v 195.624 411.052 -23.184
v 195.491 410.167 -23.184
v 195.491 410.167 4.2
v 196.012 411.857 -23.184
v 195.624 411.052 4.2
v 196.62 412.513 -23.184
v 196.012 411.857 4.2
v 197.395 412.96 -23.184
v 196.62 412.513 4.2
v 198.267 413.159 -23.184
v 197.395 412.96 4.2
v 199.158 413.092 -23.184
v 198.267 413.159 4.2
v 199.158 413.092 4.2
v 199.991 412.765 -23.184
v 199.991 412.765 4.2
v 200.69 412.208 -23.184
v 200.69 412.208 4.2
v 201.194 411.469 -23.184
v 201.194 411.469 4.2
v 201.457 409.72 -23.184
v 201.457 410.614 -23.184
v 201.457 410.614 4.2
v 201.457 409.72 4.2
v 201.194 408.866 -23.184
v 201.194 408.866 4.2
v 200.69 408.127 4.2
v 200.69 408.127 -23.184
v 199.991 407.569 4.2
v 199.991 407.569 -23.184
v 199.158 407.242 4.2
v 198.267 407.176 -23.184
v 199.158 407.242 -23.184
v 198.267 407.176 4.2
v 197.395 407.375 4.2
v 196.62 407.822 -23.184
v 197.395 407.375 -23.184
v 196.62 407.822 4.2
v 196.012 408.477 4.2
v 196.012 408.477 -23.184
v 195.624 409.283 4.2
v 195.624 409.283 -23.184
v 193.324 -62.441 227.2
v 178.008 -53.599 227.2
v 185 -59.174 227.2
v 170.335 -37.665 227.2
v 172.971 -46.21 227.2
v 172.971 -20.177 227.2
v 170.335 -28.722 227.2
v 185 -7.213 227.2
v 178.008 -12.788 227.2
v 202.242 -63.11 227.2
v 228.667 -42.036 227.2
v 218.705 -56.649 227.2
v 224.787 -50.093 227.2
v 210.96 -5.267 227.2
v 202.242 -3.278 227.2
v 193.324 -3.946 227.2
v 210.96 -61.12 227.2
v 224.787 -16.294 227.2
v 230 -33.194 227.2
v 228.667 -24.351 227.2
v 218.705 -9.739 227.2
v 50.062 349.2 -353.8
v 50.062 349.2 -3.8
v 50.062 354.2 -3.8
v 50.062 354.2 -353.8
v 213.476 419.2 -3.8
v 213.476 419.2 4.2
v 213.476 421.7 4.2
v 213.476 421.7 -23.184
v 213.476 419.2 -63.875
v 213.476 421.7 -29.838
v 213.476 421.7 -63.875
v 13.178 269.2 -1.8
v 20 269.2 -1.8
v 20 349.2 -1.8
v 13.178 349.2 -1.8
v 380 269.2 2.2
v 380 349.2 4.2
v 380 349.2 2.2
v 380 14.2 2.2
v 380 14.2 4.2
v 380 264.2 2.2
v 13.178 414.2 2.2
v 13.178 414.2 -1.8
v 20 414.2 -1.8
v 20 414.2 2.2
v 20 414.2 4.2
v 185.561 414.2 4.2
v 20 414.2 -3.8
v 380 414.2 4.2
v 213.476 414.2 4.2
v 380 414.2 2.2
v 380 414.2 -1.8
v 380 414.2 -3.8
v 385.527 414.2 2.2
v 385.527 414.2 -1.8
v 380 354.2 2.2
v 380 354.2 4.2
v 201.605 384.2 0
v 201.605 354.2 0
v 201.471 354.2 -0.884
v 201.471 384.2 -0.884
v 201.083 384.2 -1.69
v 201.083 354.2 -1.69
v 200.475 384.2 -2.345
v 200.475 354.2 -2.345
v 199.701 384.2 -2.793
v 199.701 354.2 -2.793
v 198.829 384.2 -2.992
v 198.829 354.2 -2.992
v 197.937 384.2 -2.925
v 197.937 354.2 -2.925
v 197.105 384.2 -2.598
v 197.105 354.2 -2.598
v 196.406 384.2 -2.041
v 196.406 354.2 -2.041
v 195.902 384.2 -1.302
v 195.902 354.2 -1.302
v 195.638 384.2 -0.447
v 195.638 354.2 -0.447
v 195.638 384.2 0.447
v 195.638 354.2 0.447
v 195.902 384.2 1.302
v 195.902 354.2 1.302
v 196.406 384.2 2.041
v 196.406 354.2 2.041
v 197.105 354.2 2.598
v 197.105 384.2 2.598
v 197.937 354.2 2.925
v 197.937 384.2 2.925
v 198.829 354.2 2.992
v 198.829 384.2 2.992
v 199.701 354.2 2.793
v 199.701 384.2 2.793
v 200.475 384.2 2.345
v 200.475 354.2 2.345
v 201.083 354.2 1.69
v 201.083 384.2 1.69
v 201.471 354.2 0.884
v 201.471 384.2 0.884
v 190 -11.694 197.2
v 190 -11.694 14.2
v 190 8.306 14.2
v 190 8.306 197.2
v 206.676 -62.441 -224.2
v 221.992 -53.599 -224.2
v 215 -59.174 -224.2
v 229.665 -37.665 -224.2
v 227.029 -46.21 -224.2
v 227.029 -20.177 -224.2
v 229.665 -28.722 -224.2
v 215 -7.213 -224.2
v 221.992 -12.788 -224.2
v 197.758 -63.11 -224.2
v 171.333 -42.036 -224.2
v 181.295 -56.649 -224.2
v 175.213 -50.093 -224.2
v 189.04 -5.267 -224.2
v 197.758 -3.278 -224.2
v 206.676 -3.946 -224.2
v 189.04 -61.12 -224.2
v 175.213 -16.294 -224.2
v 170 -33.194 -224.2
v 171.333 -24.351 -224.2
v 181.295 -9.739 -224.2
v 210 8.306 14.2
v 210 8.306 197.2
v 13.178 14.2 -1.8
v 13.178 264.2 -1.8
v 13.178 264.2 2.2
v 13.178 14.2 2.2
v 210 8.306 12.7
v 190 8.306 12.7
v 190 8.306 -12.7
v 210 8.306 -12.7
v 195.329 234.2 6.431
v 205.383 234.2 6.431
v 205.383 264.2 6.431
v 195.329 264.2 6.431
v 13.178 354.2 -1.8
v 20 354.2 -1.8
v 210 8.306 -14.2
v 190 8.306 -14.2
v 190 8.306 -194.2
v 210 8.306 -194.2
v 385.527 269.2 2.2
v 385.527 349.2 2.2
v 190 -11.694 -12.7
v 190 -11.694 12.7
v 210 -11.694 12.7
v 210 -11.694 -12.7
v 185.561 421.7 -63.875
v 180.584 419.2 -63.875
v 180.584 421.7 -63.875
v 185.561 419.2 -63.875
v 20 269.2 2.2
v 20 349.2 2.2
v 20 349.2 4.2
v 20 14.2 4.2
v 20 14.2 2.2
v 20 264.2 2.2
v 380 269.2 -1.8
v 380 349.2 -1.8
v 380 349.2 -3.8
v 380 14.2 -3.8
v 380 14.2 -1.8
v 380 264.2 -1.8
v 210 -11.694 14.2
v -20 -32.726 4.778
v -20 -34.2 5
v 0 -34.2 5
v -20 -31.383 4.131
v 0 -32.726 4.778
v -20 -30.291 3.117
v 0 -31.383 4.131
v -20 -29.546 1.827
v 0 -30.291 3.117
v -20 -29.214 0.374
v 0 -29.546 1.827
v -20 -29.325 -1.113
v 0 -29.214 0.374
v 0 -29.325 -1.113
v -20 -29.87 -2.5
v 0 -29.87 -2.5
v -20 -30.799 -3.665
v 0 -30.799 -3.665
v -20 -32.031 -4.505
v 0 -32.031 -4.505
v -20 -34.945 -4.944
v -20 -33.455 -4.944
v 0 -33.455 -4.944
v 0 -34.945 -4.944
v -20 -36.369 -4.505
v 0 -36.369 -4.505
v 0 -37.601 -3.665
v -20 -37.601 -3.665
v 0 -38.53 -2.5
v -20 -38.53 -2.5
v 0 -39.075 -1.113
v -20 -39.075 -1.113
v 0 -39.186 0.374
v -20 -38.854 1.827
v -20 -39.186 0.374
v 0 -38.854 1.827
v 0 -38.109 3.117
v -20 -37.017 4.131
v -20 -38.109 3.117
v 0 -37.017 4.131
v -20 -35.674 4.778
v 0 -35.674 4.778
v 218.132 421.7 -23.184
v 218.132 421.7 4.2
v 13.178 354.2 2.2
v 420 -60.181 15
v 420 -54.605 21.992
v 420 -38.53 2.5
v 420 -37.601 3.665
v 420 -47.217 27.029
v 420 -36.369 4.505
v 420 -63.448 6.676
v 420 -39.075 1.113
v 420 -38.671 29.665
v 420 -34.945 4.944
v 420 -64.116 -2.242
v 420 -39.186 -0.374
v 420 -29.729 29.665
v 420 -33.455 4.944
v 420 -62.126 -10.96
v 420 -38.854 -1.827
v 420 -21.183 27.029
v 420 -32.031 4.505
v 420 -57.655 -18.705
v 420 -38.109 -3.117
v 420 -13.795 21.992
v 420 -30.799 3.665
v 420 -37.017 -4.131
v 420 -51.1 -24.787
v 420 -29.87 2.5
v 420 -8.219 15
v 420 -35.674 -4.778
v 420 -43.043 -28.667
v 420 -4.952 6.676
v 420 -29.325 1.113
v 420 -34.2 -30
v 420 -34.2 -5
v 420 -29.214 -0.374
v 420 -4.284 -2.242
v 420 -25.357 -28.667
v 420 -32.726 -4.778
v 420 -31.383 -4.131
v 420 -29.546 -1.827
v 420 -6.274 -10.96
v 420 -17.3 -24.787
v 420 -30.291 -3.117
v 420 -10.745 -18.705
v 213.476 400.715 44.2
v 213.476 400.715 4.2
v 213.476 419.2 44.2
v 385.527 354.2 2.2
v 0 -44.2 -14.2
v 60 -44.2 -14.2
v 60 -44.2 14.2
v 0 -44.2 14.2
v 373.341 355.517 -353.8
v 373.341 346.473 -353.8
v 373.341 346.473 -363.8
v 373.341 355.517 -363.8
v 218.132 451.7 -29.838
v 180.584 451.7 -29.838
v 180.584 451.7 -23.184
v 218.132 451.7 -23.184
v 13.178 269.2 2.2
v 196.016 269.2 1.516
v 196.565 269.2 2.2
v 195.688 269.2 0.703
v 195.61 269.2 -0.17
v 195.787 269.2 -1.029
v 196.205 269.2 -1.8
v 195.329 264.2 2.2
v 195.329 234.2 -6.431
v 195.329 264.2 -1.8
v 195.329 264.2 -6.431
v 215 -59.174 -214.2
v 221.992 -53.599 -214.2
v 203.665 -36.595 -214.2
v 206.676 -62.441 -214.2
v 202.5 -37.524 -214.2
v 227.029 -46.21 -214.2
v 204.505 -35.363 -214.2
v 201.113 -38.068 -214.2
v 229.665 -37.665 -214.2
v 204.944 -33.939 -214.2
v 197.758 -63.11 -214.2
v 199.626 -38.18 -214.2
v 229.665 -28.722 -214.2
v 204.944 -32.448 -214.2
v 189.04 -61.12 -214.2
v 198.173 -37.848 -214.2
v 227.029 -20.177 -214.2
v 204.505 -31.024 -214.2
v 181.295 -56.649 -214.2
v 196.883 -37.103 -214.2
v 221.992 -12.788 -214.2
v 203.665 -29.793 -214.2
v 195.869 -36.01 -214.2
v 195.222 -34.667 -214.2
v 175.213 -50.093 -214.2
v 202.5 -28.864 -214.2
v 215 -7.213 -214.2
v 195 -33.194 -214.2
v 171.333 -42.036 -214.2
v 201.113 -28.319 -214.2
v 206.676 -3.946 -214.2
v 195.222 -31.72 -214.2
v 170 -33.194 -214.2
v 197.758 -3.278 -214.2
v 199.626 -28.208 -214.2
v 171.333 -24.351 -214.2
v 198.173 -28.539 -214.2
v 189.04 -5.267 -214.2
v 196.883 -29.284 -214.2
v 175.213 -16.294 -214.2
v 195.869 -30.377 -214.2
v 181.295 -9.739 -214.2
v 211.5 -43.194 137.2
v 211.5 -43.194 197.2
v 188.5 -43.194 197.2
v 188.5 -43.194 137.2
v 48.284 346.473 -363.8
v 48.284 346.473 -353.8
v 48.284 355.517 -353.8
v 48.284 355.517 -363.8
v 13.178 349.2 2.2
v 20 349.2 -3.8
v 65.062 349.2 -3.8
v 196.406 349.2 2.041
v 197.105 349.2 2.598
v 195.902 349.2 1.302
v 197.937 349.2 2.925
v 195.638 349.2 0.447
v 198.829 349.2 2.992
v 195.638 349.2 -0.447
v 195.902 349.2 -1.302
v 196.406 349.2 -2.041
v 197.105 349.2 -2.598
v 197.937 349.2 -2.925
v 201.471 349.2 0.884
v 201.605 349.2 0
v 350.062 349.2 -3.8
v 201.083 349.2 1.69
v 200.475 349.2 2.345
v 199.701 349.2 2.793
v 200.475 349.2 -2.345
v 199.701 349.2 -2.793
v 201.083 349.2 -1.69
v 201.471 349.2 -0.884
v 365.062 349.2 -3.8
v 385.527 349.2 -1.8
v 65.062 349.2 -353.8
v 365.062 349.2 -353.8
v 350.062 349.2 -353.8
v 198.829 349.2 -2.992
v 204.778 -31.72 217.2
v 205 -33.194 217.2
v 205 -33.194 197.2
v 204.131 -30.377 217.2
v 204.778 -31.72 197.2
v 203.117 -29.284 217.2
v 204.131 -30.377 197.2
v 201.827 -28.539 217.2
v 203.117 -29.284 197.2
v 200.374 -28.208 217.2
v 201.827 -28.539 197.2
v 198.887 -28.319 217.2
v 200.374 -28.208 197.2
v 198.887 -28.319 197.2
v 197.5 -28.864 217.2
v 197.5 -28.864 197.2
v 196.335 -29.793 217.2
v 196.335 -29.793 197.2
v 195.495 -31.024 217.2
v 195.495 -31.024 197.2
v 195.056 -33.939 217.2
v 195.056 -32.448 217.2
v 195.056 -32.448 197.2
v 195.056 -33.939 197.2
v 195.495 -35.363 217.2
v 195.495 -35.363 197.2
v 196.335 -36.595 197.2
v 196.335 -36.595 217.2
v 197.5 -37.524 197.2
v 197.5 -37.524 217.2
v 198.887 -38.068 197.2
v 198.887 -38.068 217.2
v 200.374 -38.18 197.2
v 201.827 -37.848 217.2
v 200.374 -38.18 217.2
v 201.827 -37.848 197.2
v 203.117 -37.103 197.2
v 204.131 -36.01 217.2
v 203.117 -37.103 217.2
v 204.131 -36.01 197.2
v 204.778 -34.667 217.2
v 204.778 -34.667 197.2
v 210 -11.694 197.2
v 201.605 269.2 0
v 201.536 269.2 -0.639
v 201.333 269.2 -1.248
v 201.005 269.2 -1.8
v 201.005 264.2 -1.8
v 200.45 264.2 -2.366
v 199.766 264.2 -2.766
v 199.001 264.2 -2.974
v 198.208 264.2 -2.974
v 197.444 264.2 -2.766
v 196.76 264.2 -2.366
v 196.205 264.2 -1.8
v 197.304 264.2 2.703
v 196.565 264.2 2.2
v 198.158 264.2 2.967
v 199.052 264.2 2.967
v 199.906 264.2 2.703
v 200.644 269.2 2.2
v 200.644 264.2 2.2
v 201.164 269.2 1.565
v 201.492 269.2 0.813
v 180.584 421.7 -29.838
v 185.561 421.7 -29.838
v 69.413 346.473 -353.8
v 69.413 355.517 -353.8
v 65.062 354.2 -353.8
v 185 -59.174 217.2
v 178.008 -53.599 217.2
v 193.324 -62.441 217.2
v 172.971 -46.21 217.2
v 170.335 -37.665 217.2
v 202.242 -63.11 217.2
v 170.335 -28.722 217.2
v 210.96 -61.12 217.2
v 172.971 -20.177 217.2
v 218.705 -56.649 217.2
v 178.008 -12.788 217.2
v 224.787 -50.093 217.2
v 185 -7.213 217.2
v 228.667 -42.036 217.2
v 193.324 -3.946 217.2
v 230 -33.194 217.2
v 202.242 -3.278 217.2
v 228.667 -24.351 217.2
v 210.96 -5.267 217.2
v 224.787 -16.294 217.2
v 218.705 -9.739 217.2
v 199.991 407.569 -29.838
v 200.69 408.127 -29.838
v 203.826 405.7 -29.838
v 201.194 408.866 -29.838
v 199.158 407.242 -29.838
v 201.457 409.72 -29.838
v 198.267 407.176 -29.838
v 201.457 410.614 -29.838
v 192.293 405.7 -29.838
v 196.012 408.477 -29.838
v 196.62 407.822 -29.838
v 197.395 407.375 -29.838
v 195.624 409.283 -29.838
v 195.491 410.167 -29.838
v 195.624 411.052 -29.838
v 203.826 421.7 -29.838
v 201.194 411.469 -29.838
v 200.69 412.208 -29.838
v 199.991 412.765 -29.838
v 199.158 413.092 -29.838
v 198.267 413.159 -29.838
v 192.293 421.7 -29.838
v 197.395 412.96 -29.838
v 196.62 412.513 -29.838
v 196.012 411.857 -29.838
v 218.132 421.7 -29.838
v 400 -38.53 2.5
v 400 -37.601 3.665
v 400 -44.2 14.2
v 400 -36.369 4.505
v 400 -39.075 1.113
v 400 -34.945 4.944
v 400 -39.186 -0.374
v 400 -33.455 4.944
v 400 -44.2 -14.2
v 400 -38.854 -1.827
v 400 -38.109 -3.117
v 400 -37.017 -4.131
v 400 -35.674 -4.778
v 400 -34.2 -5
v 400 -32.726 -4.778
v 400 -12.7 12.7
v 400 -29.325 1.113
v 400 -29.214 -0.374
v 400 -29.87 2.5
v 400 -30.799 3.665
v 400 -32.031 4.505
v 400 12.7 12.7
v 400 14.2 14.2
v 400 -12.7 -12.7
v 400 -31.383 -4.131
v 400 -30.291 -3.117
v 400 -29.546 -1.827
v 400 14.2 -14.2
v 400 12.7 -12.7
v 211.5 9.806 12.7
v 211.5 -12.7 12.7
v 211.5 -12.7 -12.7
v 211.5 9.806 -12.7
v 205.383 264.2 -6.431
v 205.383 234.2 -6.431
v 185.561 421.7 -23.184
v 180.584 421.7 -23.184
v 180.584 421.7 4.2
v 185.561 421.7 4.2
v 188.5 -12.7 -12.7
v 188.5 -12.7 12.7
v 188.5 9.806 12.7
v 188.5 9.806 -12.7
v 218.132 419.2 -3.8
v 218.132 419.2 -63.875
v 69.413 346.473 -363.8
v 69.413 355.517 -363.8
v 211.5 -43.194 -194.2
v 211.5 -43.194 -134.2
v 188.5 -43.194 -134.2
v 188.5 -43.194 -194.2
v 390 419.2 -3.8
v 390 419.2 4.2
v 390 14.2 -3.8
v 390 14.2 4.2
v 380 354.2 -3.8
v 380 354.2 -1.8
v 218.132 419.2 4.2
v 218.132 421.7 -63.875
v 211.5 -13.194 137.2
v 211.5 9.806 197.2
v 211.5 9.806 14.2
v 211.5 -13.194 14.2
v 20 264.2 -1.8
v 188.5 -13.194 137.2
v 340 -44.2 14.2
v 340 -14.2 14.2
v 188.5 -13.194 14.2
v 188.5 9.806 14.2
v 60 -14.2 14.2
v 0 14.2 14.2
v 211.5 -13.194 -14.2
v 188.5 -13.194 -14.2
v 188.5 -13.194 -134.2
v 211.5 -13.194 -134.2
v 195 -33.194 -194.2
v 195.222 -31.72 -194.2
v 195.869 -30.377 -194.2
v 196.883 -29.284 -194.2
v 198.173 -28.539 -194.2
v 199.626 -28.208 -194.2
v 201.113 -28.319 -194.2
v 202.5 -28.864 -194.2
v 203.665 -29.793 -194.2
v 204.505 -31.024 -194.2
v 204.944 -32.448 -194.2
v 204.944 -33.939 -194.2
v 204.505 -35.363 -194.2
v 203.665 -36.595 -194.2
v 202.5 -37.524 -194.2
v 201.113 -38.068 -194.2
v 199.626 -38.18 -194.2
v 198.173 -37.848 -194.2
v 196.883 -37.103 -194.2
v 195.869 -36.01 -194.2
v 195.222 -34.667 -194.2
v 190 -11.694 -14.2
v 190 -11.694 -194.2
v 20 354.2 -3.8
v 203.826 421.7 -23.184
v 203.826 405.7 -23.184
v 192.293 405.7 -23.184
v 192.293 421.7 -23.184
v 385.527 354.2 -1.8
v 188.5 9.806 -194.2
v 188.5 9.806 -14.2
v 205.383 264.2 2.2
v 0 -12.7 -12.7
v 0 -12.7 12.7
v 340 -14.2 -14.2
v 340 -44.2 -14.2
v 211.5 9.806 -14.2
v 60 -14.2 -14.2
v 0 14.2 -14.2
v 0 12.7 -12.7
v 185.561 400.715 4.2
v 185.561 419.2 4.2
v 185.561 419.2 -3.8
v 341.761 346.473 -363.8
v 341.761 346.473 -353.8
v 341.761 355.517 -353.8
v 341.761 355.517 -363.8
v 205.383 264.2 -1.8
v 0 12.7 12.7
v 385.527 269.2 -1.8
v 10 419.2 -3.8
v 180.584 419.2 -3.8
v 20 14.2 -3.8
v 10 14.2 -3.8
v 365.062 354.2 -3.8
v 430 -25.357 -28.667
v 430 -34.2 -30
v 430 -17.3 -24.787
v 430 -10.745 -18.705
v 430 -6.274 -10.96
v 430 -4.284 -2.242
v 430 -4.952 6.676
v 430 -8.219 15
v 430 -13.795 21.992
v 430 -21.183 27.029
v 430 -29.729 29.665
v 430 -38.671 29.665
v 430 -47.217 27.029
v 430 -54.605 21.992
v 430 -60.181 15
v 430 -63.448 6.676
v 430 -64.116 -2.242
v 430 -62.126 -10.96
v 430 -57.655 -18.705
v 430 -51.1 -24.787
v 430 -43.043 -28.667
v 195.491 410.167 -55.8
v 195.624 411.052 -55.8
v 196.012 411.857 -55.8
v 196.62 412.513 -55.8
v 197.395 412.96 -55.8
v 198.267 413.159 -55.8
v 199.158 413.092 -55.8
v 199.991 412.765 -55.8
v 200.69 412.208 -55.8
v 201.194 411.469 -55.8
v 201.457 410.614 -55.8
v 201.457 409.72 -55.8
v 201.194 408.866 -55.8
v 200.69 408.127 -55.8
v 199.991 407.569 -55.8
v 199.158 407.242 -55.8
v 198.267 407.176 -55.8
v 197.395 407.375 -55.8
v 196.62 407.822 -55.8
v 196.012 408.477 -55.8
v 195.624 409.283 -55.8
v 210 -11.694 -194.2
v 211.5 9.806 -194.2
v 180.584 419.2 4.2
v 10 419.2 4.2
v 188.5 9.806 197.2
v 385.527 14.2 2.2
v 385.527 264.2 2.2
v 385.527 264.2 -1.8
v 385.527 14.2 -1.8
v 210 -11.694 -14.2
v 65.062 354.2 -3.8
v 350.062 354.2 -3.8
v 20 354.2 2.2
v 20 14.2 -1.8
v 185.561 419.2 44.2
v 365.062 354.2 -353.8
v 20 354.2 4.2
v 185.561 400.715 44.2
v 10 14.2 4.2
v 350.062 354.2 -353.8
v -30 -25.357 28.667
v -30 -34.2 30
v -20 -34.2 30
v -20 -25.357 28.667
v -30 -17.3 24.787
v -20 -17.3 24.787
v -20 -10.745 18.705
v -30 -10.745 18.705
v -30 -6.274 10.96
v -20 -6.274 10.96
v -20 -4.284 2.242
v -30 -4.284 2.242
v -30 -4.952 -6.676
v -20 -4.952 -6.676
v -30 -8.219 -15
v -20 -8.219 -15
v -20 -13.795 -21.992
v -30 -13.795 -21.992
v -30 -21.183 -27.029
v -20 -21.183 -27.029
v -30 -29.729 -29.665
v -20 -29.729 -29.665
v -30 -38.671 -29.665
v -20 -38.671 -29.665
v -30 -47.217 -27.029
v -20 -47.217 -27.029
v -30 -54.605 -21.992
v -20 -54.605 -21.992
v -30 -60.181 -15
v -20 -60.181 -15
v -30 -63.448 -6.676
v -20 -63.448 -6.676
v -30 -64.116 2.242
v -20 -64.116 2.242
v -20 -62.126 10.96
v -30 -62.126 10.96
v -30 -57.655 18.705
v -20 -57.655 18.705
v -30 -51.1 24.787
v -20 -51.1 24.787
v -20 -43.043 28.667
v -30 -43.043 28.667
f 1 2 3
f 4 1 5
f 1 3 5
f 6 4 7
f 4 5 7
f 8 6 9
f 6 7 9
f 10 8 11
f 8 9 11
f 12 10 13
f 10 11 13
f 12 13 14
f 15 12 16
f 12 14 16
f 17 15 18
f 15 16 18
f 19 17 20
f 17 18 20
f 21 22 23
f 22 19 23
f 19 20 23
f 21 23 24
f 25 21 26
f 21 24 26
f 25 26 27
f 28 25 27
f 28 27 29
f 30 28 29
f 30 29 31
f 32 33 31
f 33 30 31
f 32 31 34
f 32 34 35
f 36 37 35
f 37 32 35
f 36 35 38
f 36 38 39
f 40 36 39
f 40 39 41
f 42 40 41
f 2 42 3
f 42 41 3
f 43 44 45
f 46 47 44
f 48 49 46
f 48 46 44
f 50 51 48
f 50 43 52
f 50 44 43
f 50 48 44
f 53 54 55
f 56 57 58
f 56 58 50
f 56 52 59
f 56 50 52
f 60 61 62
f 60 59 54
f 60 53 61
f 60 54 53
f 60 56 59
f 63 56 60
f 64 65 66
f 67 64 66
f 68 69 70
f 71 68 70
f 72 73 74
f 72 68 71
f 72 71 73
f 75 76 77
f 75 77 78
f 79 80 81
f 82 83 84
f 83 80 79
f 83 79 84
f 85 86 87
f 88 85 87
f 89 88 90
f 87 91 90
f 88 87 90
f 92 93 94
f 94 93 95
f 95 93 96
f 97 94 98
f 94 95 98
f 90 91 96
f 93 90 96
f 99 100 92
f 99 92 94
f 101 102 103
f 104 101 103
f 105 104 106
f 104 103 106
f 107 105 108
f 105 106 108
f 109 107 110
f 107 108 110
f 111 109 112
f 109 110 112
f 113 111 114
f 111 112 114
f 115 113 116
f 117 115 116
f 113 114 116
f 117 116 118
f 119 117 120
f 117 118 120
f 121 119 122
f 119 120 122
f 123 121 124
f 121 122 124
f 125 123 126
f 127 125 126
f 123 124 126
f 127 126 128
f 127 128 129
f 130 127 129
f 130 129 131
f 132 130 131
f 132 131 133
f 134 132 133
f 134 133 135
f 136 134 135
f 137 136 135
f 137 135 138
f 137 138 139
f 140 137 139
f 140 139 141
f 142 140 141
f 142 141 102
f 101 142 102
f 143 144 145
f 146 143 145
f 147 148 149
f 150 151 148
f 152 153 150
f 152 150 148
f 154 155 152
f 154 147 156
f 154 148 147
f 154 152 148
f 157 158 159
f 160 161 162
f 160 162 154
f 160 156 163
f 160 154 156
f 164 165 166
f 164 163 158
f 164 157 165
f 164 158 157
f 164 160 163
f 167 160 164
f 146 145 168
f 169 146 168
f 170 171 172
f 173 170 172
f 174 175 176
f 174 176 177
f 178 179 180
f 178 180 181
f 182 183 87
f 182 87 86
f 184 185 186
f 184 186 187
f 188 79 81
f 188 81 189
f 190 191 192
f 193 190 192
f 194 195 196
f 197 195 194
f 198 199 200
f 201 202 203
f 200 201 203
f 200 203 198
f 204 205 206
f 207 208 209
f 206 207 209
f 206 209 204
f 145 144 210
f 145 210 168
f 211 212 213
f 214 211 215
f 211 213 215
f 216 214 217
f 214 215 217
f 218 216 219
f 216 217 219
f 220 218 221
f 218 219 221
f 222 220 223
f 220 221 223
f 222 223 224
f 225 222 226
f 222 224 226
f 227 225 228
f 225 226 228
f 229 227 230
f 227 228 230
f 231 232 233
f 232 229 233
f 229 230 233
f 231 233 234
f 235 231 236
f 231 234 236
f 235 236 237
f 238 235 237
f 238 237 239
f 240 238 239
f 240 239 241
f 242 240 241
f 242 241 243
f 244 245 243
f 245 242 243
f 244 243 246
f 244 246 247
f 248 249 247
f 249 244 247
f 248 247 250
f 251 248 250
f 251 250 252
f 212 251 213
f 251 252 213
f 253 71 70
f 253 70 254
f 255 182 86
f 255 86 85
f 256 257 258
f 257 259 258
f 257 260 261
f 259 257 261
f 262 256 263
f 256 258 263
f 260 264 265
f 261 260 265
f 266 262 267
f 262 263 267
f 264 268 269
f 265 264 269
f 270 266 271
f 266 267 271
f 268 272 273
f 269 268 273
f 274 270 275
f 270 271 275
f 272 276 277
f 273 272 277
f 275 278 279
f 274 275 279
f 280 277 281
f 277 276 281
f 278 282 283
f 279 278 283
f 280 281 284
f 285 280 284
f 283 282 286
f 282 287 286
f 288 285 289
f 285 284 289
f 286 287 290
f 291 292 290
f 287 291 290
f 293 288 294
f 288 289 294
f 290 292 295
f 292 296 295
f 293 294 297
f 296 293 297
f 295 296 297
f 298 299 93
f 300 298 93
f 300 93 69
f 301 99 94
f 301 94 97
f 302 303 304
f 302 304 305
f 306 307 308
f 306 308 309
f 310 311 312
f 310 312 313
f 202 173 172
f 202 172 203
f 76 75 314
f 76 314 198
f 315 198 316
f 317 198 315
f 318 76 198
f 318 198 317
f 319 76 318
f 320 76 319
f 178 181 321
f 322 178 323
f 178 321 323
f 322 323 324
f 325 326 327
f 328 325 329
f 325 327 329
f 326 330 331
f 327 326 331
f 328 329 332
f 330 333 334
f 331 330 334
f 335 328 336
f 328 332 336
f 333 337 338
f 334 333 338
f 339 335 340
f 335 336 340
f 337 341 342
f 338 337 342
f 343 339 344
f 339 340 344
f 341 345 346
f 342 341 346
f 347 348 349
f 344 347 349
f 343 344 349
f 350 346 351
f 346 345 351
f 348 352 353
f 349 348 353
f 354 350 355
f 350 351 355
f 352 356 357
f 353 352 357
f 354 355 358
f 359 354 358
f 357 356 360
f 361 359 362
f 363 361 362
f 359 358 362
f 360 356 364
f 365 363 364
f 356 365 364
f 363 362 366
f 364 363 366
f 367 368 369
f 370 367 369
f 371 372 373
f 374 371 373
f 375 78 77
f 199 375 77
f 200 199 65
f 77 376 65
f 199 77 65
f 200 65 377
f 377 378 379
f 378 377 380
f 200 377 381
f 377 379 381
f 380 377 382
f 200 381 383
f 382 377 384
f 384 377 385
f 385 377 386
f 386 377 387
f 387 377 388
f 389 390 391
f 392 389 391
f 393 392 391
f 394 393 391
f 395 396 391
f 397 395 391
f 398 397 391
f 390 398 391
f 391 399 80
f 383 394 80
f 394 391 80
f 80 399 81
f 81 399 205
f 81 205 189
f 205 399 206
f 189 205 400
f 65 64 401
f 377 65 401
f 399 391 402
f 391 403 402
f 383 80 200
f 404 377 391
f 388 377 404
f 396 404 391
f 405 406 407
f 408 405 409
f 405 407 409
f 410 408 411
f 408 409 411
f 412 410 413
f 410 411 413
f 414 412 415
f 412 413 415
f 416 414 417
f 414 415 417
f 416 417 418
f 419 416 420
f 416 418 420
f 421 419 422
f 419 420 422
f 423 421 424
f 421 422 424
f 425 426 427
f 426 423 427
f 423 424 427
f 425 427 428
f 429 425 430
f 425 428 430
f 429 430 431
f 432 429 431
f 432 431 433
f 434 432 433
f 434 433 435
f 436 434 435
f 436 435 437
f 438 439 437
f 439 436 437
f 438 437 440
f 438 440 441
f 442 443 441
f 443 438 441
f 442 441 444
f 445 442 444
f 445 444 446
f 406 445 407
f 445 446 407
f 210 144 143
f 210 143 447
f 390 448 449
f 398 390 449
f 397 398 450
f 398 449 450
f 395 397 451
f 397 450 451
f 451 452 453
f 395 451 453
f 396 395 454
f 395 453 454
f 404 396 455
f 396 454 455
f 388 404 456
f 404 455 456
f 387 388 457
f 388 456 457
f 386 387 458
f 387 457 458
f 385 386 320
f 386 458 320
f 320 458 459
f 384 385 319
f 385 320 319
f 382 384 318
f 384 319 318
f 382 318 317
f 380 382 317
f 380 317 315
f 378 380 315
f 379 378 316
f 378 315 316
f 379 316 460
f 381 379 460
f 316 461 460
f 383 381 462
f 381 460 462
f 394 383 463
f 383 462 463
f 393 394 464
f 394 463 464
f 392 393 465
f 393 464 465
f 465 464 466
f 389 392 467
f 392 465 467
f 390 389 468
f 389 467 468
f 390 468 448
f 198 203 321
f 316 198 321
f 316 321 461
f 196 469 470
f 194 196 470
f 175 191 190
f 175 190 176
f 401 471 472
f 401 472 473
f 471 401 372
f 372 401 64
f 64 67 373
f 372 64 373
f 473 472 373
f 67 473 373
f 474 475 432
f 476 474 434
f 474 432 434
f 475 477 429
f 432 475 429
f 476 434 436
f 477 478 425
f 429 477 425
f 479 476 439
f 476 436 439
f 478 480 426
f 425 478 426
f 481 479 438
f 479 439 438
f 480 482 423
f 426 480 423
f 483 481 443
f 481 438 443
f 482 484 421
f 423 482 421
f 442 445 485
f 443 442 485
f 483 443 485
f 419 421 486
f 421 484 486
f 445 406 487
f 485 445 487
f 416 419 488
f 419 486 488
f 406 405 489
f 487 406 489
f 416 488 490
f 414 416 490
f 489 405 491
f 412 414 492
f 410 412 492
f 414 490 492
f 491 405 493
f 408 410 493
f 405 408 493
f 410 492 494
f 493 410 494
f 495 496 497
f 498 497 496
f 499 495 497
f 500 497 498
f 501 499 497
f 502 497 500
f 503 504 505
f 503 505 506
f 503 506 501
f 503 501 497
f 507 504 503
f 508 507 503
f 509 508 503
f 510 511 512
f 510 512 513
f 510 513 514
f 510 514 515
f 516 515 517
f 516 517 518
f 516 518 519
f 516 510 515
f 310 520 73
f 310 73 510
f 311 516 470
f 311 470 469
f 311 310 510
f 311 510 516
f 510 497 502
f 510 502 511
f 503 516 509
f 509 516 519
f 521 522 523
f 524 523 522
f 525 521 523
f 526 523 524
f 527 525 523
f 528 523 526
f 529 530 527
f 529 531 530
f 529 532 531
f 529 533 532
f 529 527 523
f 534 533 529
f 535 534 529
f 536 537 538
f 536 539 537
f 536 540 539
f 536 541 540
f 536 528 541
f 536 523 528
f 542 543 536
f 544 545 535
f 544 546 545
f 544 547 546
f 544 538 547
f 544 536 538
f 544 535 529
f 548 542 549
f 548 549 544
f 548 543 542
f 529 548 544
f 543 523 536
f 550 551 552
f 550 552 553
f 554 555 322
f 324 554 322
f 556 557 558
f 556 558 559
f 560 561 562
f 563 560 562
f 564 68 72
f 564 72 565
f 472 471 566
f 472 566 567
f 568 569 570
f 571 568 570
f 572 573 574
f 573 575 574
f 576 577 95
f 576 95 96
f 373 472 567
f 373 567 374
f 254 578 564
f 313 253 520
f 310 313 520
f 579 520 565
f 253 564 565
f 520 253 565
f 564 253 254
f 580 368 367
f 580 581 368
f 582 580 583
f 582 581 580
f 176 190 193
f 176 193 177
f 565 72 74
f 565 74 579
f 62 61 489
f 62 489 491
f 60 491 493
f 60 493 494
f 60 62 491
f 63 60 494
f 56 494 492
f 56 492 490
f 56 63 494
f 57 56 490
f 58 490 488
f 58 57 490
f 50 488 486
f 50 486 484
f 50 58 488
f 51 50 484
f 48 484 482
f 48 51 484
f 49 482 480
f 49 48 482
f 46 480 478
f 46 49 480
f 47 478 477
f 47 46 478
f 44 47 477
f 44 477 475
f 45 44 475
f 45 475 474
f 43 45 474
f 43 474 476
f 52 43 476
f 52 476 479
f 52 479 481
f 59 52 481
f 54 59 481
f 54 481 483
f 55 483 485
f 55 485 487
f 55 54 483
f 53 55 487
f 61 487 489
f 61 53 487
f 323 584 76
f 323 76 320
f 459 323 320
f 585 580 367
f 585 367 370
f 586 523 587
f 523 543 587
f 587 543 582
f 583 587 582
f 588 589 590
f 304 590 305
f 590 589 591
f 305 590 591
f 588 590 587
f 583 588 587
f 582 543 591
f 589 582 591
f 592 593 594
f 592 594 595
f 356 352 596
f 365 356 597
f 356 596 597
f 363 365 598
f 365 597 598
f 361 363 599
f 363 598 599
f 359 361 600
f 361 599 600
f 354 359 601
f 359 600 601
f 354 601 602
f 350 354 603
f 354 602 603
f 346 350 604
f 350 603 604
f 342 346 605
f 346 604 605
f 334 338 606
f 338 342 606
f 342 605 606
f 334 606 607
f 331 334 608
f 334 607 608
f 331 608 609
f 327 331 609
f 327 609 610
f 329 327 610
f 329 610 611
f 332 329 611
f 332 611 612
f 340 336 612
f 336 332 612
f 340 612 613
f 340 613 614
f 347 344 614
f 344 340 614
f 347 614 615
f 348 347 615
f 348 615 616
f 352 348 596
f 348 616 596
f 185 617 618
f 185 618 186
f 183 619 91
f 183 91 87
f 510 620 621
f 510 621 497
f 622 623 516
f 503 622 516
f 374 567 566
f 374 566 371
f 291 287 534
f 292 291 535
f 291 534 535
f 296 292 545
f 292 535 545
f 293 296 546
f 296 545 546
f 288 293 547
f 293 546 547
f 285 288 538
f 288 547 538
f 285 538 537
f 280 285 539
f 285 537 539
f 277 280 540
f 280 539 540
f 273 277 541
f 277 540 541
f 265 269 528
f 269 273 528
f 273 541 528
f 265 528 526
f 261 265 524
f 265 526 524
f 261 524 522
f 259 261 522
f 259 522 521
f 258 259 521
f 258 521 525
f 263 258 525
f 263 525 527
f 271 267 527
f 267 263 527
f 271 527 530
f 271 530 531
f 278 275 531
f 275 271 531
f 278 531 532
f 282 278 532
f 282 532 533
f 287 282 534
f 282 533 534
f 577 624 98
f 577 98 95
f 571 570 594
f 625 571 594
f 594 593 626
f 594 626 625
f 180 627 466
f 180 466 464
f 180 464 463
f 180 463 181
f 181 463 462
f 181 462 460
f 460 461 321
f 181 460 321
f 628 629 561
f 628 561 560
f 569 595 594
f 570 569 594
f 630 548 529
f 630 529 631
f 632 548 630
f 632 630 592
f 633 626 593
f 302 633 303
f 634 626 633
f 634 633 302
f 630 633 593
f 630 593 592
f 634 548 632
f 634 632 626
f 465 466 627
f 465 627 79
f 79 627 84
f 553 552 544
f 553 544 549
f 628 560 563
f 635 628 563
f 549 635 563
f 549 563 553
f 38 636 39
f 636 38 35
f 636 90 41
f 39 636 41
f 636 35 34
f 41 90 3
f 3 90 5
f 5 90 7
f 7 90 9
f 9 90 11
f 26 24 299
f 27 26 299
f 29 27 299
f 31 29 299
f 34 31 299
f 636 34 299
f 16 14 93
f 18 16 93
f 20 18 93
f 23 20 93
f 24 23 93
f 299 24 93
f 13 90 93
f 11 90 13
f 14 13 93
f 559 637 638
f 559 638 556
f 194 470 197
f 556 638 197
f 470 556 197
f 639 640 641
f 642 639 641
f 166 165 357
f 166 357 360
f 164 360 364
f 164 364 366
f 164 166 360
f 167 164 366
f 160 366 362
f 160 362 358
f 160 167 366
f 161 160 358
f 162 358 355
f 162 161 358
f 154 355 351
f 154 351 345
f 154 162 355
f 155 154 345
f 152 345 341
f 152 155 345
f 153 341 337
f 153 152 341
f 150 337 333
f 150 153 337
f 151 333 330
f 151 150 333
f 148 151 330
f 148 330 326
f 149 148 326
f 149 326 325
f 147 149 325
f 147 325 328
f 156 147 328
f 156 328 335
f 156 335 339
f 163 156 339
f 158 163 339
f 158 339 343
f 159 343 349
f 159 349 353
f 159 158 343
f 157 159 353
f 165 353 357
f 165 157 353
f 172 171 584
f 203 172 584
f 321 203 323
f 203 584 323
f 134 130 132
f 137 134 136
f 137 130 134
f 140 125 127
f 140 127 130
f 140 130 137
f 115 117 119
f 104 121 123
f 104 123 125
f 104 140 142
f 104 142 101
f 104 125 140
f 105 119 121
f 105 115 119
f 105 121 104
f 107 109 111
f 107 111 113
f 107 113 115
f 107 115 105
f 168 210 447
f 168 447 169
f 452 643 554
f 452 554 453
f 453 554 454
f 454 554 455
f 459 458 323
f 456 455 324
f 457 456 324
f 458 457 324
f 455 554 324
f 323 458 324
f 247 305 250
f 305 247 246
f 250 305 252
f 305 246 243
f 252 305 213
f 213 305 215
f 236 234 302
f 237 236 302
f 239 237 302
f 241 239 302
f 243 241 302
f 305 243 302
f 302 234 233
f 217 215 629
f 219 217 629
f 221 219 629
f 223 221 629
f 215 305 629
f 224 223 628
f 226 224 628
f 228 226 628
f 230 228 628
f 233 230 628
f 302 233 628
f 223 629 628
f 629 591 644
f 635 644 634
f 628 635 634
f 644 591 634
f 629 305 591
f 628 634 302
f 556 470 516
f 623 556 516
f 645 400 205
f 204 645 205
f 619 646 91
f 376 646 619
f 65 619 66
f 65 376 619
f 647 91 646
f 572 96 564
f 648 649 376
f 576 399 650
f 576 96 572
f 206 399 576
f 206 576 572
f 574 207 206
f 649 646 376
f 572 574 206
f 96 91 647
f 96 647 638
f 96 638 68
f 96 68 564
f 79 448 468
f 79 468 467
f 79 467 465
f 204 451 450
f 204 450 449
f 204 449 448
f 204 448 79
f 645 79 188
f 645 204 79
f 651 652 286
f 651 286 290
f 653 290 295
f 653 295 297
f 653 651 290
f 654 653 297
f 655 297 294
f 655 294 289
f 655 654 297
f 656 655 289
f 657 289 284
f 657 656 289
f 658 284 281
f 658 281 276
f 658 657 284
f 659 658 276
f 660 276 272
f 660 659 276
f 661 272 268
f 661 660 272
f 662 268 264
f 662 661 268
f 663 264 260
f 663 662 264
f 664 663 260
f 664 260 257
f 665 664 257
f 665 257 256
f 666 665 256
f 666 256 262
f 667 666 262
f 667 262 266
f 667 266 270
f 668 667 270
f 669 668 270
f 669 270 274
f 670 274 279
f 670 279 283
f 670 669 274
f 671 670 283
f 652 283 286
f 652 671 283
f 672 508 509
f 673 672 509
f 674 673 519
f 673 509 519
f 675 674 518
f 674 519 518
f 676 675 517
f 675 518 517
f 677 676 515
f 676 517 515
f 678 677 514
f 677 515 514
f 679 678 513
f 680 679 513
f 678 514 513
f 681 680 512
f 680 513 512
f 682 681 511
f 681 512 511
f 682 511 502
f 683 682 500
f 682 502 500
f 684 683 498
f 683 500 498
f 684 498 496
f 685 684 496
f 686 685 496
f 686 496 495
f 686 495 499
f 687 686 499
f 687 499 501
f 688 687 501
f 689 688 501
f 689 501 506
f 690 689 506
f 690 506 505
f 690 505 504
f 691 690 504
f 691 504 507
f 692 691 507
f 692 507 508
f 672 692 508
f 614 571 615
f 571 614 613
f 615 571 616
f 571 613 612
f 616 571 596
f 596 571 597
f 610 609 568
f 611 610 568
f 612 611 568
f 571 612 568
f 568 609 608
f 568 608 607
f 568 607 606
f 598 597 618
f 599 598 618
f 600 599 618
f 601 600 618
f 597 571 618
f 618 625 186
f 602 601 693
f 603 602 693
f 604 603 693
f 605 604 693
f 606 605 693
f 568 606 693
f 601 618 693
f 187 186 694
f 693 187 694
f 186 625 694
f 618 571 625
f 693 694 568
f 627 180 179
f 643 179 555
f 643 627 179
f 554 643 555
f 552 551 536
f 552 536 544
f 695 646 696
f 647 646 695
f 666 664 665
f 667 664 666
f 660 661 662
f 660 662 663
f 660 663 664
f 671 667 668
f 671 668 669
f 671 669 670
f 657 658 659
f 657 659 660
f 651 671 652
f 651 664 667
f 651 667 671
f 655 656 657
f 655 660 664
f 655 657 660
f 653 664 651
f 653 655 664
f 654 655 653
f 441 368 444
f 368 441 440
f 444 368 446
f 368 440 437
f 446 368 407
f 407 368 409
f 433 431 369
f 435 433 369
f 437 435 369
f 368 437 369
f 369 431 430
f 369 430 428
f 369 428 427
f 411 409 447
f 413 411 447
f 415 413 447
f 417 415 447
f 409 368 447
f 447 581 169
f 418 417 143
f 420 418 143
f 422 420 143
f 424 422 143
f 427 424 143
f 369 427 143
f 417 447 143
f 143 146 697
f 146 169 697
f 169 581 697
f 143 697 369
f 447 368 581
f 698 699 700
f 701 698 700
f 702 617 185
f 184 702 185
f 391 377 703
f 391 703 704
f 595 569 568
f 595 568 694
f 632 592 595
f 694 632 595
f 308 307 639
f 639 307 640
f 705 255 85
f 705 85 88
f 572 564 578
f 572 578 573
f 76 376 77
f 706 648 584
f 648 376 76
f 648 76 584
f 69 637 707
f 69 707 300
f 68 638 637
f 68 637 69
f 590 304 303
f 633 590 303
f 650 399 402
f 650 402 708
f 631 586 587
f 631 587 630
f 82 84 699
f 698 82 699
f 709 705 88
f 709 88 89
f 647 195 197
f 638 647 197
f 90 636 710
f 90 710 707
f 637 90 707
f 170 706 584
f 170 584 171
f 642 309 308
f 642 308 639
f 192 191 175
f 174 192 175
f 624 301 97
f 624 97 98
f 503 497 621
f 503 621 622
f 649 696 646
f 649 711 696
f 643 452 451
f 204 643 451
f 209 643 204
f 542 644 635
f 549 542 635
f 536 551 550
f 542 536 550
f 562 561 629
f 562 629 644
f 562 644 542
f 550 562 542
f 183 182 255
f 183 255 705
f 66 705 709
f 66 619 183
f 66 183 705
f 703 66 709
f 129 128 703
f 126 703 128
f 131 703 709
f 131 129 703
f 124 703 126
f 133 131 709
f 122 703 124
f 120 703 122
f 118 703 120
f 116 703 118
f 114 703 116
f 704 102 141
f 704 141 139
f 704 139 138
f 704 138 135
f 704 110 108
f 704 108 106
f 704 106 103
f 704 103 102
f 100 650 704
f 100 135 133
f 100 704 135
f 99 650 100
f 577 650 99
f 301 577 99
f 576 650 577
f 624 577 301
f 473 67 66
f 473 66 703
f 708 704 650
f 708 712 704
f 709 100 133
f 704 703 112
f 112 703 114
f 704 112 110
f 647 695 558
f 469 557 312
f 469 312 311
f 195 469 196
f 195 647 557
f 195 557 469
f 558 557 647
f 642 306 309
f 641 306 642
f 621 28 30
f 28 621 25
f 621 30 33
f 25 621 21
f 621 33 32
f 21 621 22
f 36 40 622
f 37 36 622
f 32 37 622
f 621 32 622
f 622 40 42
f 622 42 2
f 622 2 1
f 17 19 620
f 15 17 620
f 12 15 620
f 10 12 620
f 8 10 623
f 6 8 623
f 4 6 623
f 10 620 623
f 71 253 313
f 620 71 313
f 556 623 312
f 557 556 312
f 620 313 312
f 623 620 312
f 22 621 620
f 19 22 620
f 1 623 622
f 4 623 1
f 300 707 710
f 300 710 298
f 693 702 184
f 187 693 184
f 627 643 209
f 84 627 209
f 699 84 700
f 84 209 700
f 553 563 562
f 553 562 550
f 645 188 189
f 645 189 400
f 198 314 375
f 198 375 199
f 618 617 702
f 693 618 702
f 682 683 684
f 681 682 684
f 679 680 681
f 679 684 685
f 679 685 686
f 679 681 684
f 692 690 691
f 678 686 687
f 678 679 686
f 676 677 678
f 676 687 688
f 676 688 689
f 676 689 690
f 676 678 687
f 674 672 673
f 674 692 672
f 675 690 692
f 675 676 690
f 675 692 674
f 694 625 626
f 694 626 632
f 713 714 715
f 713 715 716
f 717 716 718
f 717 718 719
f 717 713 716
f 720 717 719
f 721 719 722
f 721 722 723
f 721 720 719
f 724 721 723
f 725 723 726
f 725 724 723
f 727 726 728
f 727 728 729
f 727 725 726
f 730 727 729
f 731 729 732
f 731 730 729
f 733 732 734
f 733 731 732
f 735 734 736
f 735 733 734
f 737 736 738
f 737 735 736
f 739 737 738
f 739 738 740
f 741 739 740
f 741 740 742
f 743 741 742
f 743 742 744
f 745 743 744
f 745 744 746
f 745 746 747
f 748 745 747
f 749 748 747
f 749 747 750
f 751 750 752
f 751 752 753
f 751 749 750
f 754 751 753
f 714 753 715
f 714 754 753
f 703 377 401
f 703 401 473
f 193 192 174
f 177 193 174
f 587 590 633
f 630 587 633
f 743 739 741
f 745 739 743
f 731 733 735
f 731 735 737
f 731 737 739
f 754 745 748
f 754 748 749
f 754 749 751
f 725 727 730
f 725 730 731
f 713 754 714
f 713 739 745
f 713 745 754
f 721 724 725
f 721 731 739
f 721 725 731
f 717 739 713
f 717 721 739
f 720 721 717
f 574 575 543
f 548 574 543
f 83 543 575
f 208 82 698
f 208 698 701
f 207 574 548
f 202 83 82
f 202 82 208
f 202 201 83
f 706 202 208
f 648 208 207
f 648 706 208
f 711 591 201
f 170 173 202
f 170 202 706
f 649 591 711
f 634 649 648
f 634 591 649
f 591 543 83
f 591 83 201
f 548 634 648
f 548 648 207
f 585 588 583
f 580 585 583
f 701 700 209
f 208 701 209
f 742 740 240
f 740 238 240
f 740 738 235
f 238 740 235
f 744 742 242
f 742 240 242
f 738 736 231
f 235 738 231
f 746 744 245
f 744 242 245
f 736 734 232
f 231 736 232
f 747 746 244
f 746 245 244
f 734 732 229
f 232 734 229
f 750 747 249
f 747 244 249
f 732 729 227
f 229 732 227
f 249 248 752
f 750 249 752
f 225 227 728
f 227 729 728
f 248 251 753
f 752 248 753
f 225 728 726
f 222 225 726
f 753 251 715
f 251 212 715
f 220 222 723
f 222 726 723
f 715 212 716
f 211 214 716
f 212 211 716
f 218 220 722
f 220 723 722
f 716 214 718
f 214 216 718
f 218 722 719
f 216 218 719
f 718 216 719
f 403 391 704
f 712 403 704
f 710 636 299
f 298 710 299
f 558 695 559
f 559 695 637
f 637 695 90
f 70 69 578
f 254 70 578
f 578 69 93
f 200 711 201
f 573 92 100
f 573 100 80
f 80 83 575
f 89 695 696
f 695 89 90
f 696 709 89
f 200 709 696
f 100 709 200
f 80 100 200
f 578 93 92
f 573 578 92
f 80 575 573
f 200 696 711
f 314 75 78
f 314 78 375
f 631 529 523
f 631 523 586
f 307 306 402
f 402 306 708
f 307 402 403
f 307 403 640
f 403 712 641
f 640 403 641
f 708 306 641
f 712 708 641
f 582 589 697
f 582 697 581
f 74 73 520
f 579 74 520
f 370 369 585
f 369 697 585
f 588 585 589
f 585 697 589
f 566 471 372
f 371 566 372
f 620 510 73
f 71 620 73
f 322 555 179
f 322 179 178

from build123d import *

# Parameters (mm, degrees)
SKETCH1_W                = 28.4
SKETCH1_H                = 28.4
SKETCH1_W_2              = 25.4
SKETCH1_H_2              = 25.4
EXTRUDE_THIN1_DEPTH      = 400
SKETCH2_W                = 23
SKETCH2_H                = 23
SKETCH2_W_2              = 20
SKETCH2_H_2              = 20
EXTRUDE_THIN2_DEPTH      = 183
EXTRUDE_THIN2_DEPTH_BACK = 208.4
SKETCH3_W                = 60
SKETCH3_H                = 28.4
BOSS_EXTRUDE1_DEPTH      = 30
SKETCH4_W                = 23
SKETCH4_H                = 60
BOSS_EXTRUDE2_DEPTH      = 30
SKETCH5_R                = 5
BOSS_EXTRUDE3_DEPTH      = 30
SKETCH6_R                = 5
BOSS_EXTRUDE4_DEPTH      = 30
SKETCH7_R                = 5
BOSS_EXTRUDE5_DEPTH      = 30
SKETCH8_R                = 5
BOSS_EXTRUDE6_DEPTH      = 30
BOSS_EXTRUDE7_DEPTH      = 400
SKETCH10_W               = 372.349277715
SKETCH10_H               = 4
BOSS_EXTRUDE8_DEPTH      = 5
SKETCH11_W               = 380
SKETCH11_H               = 8
BOSS_EXTRUDE9_DEPTH      = 5
SKETCH12_W               = 27.915252313
SKETCH12_H               = 18.485240527
BOSS_EXTRUDE10_DEPTH     = 40
SKETCH13_R               = 3
BOSS_EXTRUDE11_DEPTH     = 60
SKETCH14_W               = 4.655382852
SKETCH14_H               = 68.075309474
SKETCH14_W_2             = 4.976973146
BOSS_EXTRUDE12_DEPTH     = 2.5
SKETCH15_W               = 37.547608311
SKETCH15_H               = 6.653489581
BOSS_EXTRUDE13_DEPTH     = 30
SKETCH16_W               = 11.532338845
SKETCH16_H               = 6.653489581
BOSS_EXTRUDE14_DEPTH     = 16
SKETCH17_W               = 10.054157613
SKETCH17_H               = 12.862513988
BOSS_EXTRUDE15_DEPTH     = 30
SKETCH18_R               = 3
BOSS_EXTRUDE16_DEPTH     = 120
SKETCH19_W               = 380
SKETCH19_H               = 8
BOSS_EXTRUDE17_DEPTH     = 5
SKETCH22_W               = 15
SKETCH22_H               = 5
BOSS_EXTRUDE18_DEPTH     = 350
SKETCH23_W               = 21.129059452
SKETCH23_H               = 9.044463221
SKETCH23_W_2             = 31.579735641
BOSS_EXTRUDE19_DEPTH     = 10
SKETCH24_R               = 30
BOSS_EXTRUDE20_DEPTH     = 10
SKETCH25_R               = 30
BOSS_EXTRUDE21_DEPTH     = 10
SKETCH26_R               = 30
BOSS_EXTRUDE22_DEPTH     = 10
SKETCH27_R               = 30
BOSS_EXTRUDE23_DEPTH     = 10


with BuildPart() as part:
    # Sketch1 → Extrude-Thin1 (new body)
    with BuildSketch(Plane(origin=(0, 0, 0), x_dir=(0, 0, -1), z_dir=(1, 0, 0))):
        Rectangle(SKETCH1_W, SKETCH1_H)
        Rectangle(SKETCH1_W_2, SKETCH1_H_2, mode=Mode.SUBTRACT)
    extrude(amount=EXTRUDE_THIN1_DEPTH)

    # Sketch2 → Extrude-Thin2 (add, two sides)
    with BuildSketch(Plane.XY.offset(14.2)) as extrude_thin2_sk:
        with Locations((200, -1.693644648)):
            Rectangle(SKETCH2_W, SKETCH2_H)
        with Locations((200, -1.693644648)):
            Rectangle(SKETCH2_W_2, SKETCH2_H_2, mode=Mode.SUBTRACT)
    extrude(amount=EXTRUDE_THIN2_DEPTH)
    extrude(extrude_thin2_sk.sketch, amount=-EXTRUDE_THIN2_DEPTH_BACK)

    # Sketch3 → Boss-Extrude1 (add)
    with BuildSketch(Plane(origin=(0, -14.2, 0), x_dir=(-1, 0, 0), z_dir=(0, -1, 0))):
        with Locations((-370, 0)):
            Rectangle(SKETCH3_W, SKETCH3_H)
        with Locations((-30, 0)):
            Rectangle(SKETCH3_W, SKETCH3_H)
    extrude(amount=BOSS_EXTRUDE1_DEPTH)

    # Sketch4 → Boss-Extrude2 (add)
    with BuildSketch(Plane(origin=(0, -13.193644648, 0), x_dir=(-1, 0, 0), z_dir=(0, -1, 0))):
        with Locations((-200, -167.2)):
            Rectangle(SKETCH4_W, SKETCH4_H)
        with Locations((-200, 164.2)):
            Rectangle(SKETCH4_W, SKETCH4_H)
    extrude(amount=BOSS_EXTRUDE2_DEPTH)

    # Sketch5 → Boss-Extrude3 (add)
    with BuildSketch(Plane(origin=(400, 0, 0), x_dir=(0, 0, -1), z_dir=(1, 0, 0))):
        with Locations((0, -34.2)):
            Circle(SKETCH5_R)
    extrude(amount=BOSS_EXTRUDE3_DEPTH)

    # Sketch6 → Boss-Extrude4 (add)
    with BuildSketch(Plane(origin=(0, 0, -194.2), x_dir=(-1, 0, 0), z_dir=(0, 0, -1))):
        with Locations((-200, -33.193644648)):
            Circle(SKETCH6_R)
    extrude(amount=BOSS_EXTRUDE4_DEPTH)

    # Sketch7 → Boss-Extrude5 (add)
    with BuildSketch(Plane.ZY):
        with Locations((0, -34.2)):
            Circle(SKETCH7_R)
    extrude(amount=BOSS_EXTRUDE5_DEPTH)

    # Sketch8 → Boss-Extrude6 (add)
    with BuildSketch(Plane.XY.offset(197.2)):
        with Locations((200, -33.193644648)):
            Circle(SKETCH8_R)
    extrude(amount=BOSS_EXTRUDE6_DEPTH)

    # Sketch9 → Boss-Extrude7 (add)
    with BuildSketch(Plane(origin=(0, 14.2, 0), x_dir=(1, 0, 0), z_dir=(0, 1, 0))):
        Polygon((10, 3.8), (20, 3.8), (20, 1.8), (13.177515759, 1.8), (13.177515759, -2.2), (20, -2.2), (20, -4.2), (10, -4.2), align=None)
        Polygon((380, 3.8), (390, 3.8), (390, -4.2), (380, -4.2), (380, -2.2), (385.526793474, -2.2), (385.526793474, 1.8), (380, 1.8), align=None)
    extrude(amount=BOSS_EXTRUDE7_DEPTH)

    # Sketch10 → Boss-Extrude8 (add)
    with BuildSketch(Plane(origin=(0, 264.2, 0), x_dir=(1, 0, 0), z_dir=(0, 1, 0))):
        with Locations((199.352154617, -0.2)):
            Rectangle(SKETCH10_W, SKETCH10_H)
    extrude(amount=BOSS_EXTRUDE8_DEPTH)

    # Sketch11 → Boss-Extrude9 (add)
    with BuildSketch(Plane(origin=(0, 414.2, 0), x_dir=(1, 0, 0), z_dir=(0, 1, 0))):
        with Locations((200, -0.2)):
            Rectangle(SKETCH11_W, SKETCH11_H)
    extrude(amount=BOSS_EXTRUDE9_DEPTH)

    # Sketch12 → Boss-Extrude10 (add)
    with BuildSketch(Plane.XY.offset(4.2)):
        with Locations((199.518702547, 409.957379737)):
            Rectangle(SKETCH12_W, SKETCH12_H)
    extrude(amount=BOSS_EXTRUDE10_DEPTH)

    # Sketch13 → Boss-Extrude11 (add)
    with BuildSketch(Plane(origin=(0, 0, 4.2), x_dir=(-1, 0, 0), z_dir=(0, 0, -1))):
        with Locations((-198.49073191, 410.167255752)):
            Circle(SKETCH13_R)
    extrude(amount=BOSS_EXTRUDE11_DEPTH)

    # Sketch14 → Boss-Extrude12 (add)
    with BuildSketch(Plane(origin=(0, 419.2, 0), x_dir=(1, 0, 0), z_dir=(0, 1, 0))):
        with Locations((215.804020129, 29.837654737)):
            Rectangle(SKETCH14_W, SKETCH14_H)
        with Locations((183.072589817, 29.837654737)):
            Rectangle(SKETCH14_W_2, SKETCH14_H)
    extrude(amount=BOSS_EXTRUDE12_DEPTH)

    # Sketch15 → Boss-Extrude13 (add)
    with BuildSketch(Plane(origin=(0, 421.7, 0), x_dir=(1, 0, 0), z_dir=(0, 1, 0))):
        with Locations((199.357907399, 26.510909946)):
            Rectangle(SKETCH15_W, SKETCH15_H)
    extrude(amount=BOSS_EXTRUDE13_DEPTH)

    # Sketch16 → Boss-Extrude14 (add)
    with BuildSketch(Plane(origin=(0, 421.7, 0), x_dir=(-1, 0, 0), z_dir=(0, -1, 0))):
        with Locations((-198.059420633, 26.510909946)):
            Rectangle(SKETCH16_W, SKETCH16_H)
    extrude(amount=BOSS_EXTRUDE14_DEPTH)

    # Sketch17 → Boss-Extrude15 (add)
    with BuildSketch(Plane(origin=(0, 264.2, 0), x_dir=(-1, 0, 0), z_dir=(0, -1, 0))):
        with Locations((-200.355829852, 0)):
            Rectangle(SKETCH17_W, SKETCH17_H)
    extrude(amount=BOSS_EXTRUDE15_DEPTH)

    # Sketch18 → Boss-Extrude16 (add)
    with BuildSketch(Plane(origin=(0, 264.2, 0), x_dir=(1, 0, 0), z_dir=(0, 1, 0))):
        with Locations((198.604681124, 0)):
            Circle(SKETCH18_R)
    extrude(amount=BOSS_EXTRUDE16_DEPTH)

    # Sketch19 → Boss-Extrude17 (add)
    with BuildSketch(Plane(origin=(0, 349.2, 0), x_dir=(1, 0, 0), z_dir=(0, 1, 0))):
        with Locations((200, -0.2)):
            Rectangle(SKETCH19_W, SKETCH19_H)
    extrude(amount=BOSS_EXTRUDE17_DEPTH)

    # Sketch22 → Boss-Extrude18 (add)
    with BuildSketch(Plane(origin=(0, 0, -3.8), x_dir=(-1, 0, 0), z_dir=(0, 0, -1))):
        with Locations((-357.561728319, 351.7)):
            Rectangle(SKETCH22_W, SKETCH22_H)
        with Locations((-57.561728319, 351.7)):
            Rectangle(SKETCH22_W, SKETCH22_H)
    extrude(amount=BOSS_EXTRUDE18_DEPTH)

    # Sketch23 → Boss-Extrude19 (add)
    with BuildSketch(Plane(origin=(0, 0, -353.8), x_dir=(-1, 0, 0), z_dir=(0, 0, -1))):
        with Locations((-58.848339235, 350.994945207)):
            Rectangle(SKETCH23_W, SKETCH23_H)
        with Locations((-357.551157011, 350.994945207)):
            Rectangle(SKETCH23_W_2, SKETCH23_H)
    extrude(amount=BOSS_EXTRUDE19_DEPTH)

    # Sketch24 → Boss-Extrude20 (add)
    with BuildSketch(Plane(origin=(0, 0, -224.2), x_dir=(-1, 0, 0), z_dir=(0, 0, -1))):
        with Locations((-200, -33.193644648)):
            Circle(SKETCH24_R)
    extrude(amount=-BOSS_EXTRUDE20_DEPTH)

    # Sketch25 → Boss-Extrude21 (add)
    with BuildSketch(Plane.ZY.offset(30)):
        with Locations((0, -34.2)):
            Circle(SKETCH25_R)
    extrude(amount=-BOSS_EXTRUDE21_DEPTH)

    # Sketch26 → Boss-Extrude22 (add)
    with BuildSketch(Plane.XY.offset(227.2)):
        with Locations((200, -33.193644648)):
            Circle(SKETCH26_R)
    extrude(amount=-BOSS_EXTRUDE22_DEPTH)

    # Sketch27 → Boss-Extrude23 (add)
    with BuildSketch(Plane(origin=(430, 0, 0), x_dir=(0, 0, -1), z_dir=(1, 0, 0))):
        with Locations((0, -34.2)):
            Circle(SKETCH27_R)
    extrude(amount=-BOSS_EXTRUDE23_DEPTH)


solid = part.part
